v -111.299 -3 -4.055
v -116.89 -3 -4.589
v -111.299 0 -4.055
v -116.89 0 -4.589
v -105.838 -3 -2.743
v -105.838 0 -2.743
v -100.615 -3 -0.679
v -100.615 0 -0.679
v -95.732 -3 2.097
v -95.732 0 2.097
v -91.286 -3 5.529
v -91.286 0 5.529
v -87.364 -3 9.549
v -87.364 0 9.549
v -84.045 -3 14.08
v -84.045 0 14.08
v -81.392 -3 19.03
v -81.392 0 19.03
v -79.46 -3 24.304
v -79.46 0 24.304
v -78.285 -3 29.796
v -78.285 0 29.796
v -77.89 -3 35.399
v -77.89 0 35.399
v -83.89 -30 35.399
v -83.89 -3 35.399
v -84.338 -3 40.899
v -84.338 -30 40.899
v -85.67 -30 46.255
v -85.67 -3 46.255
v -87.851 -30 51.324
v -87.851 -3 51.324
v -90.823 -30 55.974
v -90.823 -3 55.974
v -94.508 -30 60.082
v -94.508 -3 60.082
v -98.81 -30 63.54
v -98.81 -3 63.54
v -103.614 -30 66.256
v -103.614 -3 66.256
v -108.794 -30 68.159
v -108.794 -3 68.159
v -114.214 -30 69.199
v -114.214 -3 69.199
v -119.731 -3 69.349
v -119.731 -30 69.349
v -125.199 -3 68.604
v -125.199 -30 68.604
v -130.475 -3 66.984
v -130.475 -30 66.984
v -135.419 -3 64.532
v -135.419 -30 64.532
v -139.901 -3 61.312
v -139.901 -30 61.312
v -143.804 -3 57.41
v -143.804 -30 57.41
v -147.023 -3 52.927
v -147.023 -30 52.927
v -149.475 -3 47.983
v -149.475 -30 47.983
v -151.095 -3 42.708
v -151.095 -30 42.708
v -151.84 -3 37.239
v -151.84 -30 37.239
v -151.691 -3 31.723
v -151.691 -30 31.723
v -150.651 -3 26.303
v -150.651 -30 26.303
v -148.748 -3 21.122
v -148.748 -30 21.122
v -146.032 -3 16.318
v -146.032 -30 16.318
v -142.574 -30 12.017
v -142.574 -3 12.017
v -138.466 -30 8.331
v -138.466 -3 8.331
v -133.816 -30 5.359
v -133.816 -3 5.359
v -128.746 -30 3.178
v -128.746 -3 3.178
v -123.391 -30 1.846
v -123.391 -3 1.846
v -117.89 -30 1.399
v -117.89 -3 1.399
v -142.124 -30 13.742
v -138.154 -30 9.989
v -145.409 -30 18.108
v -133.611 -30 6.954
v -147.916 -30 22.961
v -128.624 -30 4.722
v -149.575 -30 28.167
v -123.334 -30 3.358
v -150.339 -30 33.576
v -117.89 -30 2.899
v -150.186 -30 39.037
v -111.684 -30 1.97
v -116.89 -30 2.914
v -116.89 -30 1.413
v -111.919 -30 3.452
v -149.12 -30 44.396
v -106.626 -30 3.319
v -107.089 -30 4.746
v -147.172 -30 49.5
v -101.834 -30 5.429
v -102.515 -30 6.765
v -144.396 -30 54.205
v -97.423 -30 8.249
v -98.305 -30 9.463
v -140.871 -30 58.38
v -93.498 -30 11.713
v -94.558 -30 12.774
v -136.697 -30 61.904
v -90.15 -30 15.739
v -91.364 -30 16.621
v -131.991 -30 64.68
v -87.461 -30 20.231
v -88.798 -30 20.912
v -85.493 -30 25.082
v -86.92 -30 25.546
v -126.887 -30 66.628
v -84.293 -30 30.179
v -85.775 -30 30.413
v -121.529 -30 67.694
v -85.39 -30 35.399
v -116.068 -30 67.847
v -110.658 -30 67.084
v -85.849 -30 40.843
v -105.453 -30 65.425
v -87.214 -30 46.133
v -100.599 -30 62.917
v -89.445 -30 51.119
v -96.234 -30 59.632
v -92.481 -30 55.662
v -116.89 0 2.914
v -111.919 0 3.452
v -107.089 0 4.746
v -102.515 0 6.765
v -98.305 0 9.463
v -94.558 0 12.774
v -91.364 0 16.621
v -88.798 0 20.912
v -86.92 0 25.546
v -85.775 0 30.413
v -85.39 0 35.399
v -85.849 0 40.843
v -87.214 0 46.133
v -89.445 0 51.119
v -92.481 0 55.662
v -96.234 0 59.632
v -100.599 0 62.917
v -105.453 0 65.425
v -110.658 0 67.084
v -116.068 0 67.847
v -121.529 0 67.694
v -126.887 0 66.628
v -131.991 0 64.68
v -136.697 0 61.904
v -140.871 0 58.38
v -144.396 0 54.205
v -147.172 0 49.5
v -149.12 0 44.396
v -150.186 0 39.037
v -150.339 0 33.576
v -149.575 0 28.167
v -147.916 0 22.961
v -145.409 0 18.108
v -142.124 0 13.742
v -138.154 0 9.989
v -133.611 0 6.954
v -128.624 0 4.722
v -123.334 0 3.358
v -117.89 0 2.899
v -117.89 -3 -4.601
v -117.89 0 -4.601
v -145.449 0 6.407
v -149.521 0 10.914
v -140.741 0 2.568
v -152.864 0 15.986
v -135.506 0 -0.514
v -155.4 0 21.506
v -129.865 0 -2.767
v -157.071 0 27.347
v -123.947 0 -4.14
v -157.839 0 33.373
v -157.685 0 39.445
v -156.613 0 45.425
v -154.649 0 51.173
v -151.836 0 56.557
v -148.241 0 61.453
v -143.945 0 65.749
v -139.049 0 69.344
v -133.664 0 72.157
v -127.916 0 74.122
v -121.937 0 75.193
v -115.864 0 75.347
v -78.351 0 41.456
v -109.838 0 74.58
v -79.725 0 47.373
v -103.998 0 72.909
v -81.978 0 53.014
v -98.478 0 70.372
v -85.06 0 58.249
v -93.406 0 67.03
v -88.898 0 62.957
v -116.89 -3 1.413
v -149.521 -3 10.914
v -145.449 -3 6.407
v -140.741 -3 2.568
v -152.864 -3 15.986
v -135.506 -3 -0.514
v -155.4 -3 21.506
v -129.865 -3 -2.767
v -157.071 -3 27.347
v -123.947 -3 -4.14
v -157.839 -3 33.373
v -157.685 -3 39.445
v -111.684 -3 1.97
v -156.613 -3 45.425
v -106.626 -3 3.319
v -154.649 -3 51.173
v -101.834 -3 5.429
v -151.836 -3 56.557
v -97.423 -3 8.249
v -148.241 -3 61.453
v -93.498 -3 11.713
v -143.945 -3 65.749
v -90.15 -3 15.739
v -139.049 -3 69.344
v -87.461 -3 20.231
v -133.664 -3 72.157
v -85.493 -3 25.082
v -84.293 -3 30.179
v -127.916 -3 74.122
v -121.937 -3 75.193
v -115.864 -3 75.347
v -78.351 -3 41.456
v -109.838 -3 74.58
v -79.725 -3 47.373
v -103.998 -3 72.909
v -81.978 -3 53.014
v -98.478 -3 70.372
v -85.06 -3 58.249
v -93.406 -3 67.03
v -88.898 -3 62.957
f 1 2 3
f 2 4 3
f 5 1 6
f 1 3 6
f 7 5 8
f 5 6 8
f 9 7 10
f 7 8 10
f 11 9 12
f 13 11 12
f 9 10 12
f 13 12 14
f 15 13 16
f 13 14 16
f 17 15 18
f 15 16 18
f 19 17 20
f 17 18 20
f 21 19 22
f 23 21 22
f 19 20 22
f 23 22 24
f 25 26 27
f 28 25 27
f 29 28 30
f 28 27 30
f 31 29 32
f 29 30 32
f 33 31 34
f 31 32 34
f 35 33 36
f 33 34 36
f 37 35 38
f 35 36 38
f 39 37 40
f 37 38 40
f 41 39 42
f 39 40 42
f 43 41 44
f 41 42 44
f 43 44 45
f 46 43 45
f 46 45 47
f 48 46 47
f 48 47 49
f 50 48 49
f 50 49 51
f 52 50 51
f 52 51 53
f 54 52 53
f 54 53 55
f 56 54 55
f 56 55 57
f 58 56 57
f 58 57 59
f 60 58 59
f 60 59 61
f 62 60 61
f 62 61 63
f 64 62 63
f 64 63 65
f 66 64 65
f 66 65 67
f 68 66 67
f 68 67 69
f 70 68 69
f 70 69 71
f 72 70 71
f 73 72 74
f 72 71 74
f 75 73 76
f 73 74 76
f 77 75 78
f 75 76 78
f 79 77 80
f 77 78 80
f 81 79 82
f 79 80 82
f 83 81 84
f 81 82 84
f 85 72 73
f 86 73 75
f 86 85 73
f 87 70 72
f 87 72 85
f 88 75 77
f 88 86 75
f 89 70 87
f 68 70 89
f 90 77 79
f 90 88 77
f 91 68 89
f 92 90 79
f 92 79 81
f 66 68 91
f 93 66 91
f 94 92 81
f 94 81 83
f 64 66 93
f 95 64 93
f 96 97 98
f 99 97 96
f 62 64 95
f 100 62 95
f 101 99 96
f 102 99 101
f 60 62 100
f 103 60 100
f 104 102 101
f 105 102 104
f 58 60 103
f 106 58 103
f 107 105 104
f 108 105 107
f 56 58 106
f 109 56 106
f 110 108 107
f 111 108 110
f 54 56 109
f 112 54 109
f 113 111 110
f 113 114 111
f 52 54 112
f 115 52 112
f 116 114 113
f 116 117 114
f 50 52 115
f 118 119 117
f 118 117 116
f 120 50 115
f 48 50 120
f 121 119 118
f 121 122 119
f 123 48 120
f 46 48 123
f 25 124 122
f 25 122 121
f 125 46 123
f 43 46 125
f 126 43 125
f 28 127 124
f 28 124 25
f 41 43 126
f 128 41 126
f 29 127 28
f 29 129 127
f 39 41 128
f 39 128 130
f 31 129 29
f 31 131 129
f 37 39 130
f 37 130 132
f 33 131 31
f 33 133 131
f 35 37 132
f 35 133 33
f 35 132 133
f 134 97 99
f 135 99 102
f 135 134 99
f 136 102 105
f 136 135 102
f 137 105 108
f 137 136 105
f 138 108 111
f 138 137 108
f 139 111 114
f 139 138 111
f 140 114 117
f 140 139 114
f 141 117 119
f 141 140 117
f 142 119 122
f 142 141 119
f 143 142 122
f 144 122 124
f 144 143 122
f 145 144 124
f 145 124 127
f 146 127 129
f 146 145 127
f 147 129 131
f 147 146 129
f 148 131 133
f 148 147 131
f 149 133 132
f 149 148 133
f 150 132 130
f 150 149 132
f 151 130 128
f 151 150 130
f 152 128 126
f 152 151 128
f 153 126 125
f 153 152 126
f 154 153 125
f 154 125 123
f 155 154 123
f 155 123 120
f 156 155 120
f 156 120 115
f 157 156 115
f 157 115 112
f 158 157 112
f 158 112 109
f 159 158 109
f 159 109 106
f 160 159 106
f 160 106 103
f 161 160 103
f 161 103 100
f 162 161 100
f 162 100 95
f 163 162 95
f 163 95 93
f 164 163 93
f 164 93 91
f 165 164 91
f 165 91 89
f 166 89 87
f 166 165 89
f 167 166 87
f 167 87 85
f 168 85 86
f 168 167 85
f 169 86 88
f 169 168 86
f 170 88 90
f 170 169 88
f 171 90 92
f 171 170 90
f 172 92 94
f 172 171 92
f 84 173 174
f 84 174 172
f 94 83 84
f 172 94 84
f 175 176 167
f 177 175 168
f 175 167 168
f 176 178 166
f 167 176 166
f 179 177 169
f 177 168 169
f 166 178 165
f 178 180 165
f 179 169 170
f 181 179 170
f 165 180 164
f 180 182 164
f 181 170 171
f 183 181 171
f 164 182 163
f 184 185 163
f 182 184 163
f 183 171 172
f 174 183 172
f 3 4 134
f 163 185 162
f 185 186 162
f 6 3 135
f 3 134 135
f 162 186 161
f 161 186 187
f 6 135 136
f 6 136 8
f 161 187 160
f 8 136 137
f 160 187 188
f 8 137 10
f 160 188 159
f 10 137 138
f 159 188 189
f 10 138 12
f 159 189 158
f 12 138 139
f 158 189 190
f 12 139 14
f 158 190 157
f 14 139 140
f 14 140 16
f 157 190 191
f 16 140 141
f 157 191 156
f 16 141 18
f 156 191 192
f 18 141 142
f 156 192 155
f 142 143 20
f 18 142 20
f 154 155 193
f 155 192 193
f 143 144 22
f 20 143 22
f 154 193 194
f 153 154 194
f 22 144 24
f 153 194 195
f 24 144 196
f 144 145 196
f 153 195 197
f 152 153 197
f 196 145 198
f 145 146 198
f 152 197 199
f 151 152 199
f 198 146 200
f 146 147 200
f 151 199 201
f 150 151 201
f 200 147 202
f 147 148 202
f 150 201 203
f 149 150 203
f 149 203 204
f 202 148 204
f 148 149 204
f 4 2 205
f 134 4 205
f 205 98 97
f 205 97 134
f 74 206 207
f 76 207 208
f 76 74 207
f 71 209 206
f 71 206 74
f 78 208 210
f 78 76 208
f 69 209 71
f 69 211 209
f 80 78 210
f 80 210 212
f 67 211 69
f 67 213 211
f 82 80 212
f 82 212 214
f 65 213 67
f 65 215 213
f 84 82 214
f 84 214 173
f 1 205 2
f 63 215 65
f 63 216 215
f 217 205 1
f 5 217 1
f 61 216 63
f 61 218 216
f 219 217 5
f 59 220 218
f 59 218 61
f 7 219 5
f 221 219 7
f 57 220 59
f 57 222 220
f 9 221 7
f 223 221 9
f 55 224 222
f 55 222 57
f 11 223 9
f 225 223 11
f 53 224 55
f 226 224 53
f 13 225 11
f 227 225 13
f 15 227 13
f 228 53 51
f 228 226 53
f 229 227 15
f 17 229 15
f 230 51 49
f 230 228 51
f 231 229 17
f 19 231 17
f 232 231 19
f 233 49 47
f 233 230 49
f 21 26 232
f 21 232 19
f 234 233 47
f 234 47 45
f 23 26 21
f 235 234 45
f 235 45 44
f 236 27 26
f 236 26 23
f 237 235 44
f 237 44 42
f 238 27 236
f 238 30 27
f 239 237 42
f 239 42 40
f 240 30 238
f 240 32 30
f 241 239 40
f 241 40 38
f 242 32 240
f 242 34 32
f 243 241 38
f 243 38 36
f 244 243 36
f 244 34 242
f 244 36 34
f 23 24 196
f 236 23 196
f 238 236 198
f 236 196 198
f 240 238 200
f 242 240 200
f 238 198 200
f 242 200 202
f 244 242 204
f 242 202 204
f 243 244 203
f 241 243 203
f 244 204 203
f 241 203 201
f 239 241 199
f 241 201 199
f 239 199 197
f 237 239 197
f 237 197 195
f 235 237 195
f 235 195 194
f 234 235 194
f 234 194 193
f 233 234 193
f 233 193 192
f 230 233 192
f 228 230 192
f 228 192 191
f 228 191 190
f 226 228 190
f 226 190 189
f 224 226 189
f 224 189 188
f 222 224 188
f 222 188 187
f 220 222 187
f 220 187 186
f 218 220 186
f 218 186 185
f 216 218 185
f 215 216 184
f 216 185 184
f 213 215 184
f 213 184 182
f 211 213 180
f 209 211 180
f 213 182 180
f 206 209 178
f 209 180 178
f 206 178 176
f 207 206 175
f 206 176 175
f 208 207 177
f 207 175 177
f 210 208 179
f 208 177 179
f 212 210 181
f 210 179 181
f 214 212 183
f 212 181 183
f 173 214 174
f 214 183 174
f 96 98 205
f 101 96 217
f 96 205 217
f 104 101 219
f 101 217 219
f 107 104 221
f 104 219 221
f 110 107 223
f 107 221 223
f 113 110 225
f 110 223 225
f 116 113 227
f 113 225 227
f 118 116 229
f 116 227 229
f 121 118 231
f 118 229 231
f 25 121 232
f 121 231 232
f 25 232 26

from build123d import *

# Parameters (mm, degrees)
F0_R     = 40
F0_R_2   = 34
F0_R_3   = 32.5
F1_DEPTH = 3
F2_R     = 34
F2_R_2   = 32.5
F3_DEPTH = 27
F4_W     = 1
F4_H     = 46
F5_DEPTH = 56.9


with BuildPart() as f1:
    # F0 (on Front) → F1 (new body)
    with BuildSketch(Plane.XZ):
        with Locations((-117.890202, 35.398554)):
            Circle(F0_R)
        with Locations((-117.890202, 35.398554)):
            Circle(F0_R_2, mode=Mode.SUBTRACT)
        with Locations((-117.890202, 35.398554)):
            Circle(F0_R_2)
        with Locations((-117.890202, 35.398554)):
            Circle(F0_R_3, mode=Mode.SUBTRACT)
    extrude(amount=F1_DEPTH)

    # F2 (on face) → F3 (join)
    with BuildSketch(Plane.XZ.offset(3)):
        with Locations((-117.890202, 35.398554)):
            Circle(F2_R)
        with Locations((-117.890202, 35.398554)):
            Circle(F2_R_2, mode=Mode.SUBTRACT)
    extrude(amount=F3_DEPTH)

    # F4 (on face) → F5 (cut)
    with BuildSketch(Plane.XZ.offset(30)):
        with Locations((-117.390202, 12.398554)):
            Rectangle(F4_W, F4_H)
    extrude(amount=-F5_DEPTH, mode=Mode.SUBTRACT)


solid = f1.part
